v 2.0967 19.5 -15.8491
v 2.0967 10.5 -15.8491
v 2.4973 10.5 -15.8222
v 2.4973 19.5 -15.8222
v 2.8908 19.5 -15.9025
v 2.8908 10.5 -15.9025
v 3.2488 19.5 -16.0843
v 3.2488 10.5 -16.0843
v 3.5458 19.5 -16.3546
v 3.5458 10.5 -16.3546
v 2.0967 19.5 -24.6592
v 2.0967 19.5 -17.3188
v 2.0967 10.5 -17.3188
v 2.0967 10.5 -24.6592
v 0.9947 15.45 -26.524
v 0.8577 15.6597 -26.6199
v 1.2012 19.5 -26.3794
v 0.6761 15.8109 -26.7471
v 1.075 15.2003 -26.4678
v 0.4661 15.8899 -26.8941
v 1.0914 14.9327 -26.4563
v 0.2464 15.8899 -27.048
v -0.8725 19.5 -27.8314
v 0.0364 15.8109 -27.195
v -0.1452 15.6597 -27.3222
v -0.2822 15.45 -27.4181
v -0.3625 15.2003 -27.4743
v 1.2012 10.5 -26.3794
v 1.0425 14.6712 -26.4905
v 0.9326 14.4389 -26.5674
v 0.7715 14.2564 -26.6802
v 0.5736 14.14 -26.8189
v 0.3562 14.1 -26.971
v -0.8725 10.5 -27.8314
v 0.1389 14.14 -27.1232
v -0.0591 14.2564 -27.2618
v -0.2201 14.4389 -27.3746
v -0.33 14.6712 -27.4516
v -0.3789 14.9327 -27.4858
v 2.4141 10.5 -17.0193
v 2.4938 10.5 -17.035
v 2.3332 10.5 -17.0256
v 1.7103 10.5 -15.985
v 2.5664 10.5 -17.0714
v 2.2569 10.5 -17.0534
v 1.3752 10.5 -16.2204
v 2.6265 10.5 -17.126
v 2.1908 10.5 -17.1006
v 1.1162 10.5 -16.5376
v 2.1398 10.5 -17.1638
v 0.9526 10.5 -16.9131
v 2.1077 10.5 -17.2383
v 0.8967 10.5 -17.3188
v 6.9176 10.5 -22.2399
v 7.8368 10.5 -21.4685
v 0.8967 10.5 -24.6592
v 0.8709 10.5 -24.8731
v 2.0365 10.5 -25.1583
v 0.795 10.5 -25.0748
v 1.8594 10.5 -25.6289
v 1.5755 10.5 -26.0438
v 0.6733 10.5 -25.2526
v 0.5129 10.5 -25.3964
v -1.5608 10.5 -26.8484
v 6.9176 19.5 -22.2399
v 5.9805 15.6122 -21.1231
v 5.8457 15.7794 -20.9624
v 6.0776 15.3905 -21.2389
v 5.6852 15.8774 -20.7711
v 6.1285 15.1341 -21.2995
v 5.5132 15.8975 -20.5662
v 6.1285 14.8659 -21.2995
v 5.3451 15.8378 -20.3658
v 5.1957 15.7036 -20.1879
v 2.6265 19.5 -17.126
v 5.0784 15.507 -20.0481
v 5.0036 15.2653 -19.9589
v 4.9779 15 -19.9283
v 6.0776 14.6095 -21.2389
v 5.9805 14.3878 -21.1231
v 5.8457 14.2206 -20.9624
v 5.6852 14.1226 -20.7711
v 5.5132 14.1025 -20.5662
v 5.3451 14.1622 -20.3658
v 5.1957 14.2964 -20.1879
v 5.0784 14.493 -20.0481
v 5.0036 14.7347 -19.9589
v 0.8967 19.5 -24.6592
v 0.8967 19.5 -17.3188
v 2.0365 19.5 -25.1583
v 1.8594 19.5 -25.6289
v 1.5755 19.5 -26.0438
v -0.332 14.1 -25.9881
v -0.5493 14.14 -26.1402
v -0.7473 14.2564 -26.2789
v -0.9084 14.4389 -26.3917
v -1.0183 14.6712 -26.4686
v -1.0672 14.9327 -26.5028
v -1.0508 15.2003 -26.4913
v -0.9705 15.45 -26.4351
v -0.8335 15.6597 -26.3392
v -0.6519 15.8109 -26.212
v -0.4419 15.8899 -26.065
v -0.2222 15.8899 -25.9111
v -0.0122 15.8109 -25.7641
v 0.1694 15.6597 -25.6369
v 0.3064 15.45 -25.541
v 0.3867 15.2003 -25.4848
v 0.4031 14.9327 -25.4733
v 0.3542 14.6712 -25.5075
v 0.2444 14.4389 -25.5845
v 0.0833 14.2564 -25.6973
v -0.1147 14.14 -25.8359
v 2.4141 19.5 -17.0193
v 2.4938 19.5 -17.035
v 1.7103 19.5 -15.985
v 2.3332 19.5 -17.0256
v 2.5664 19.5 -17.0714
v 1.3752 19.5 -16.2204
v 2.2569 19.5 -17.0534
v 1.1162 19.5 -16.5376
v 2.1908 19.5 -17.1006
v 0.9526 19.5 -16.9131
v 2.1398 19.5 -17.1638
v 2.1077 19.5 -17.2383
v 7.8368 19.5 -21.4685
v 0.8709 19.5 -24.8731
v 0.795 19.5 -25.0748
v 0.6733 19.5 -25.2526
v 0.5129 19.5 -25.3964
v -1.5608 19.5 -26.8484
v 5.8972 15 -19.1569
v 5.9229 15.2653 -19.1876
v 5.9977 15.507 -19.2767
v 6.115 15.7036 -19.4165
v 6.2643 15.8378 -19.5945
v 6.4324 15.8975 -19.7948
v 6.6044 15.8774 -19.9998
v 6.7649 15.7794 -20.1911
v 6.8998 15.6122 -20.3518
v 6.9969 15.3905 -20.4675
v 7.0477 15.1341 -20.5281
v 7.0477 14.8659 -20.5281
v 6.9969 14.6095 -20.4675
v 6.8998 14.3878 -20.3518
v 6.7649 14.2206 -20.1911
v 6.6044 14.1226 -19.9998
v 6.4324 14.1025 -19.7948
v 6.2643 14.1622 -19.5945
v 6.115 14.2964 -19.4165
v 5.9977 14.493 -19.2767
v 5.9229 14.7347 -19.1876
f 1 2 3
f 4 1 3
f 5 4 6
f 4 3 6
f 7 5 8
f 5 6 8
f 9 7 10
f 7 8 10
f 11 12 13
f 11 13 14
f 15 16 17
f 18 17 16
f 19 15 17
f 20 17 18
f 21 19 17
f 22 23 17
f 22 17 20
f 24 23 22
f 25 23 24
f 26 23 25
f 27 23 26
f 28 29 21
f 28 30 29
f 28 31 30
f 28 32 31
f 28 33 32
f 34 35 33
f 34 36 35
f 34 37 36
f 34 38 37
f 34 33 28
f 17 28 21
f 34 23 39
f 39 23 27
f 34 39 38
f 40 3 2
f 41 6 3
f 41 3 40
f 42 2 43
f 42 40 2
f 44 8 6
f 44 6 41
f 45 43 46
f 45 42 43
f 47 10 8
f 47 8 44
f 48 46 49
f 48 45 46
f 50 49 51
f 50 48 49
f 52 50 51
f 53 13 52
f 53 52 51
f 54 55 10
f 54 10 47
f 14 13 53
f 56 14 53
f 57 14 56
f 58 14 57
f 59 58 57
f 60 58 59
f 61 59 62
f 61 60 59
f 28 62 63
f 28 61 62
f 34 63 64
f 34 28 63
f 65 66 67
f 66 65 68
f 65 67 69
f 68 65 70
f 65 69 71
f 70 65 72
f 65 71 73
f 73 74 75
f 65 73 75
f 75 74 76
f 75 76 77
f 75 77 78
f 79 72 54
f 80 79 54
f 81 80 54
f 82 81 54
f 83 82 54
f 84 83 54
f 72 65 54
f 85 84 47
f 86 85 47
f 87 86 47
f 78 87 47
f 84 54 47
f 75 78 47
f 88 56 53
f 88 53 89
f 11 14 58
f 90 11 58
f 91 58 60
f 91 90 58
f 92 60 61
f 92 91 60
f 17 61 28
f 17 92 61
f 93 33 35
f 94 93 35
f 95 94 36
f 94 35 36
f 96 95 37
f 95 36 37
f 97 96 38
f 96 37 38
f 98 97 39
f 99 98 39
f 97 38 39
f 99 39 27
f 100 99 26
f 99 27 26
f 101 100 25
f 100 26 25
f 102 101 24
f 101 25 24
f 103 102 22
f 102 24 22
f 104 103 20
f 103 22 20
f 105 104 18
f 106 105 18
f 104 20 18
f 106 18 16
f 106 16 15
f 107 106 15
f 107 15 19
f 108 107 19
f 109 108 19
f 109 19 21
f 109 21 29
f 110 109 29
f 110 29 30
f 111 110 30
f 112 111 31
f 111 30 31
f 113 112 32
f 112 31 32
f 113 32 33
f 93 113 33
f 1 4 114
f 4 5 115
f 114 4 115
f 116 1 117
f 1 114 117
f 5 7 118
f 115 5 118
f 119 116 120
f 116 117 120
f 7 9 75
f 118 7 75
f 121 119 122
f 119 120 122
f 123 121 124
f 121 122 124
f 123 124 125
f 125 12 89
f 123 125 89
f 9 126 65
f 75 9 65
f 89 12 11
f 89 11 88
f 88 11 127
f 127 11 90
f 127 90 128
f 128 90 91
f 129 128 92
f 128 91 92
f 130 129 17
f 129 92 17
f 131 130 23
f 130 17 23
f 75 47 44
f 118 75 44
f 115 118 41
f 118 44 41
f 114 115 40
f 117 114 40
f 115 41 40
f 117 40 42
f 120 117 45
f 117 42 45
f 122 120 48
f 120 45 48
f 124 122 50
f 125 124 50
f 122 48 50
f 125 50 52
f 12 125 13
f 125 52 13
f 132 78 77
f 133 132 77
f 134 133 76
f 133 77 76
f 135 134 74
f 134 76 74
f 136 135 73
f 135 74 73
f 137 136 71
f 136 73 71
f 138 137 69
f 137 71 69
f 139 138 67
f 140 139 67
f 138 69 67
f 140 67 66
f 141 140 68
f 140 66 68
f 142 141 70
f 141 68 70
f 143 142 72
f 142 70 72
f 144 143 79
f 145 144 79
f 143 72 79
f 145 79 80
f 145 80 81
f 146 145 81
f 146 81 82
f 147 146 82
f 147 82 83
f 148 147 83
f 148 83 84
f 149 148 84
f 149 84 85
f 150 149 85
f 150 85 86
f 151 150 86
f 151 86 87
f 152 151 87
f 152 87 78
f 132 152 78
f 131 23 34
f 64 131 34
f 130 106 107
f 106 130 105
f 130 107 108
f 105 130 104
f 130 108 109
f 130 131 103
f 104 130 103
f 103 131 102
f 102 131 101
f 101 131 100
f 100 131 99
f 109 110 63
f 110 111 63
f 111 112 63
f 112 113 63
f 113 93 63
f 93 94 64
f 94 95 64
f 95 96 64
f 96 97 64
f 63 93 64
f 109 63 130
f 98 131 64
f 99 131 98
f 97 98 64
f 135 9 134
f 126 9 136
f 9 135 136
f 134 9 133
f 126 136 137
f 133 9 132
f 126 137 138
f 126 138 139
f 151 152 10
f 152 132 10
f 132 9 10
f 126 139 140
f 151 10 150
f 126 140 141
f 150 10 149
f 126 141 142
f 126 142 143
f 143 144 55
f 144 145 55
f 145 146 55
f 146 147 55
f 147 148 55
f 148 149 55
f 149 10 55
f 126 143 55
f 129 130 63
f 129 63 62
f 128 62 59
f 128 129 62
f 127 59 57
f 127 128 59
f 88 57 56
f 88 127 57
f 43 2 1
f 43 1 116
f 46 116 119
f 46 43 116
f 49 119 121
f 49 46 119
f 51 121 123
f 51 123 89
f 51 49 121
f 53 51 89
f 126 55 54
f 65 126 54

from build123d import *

# Parameters (mm, degrees)
SKETCH_2_W                       = 35
SKETCH_2_H                       = 30
EXTRUDE_1_DEPTH                  = 1
SHEET_START                      = -35
SHEET_METAL_1_OUTLINE_W          = 3
SHEET_METAL_1_OUTLINE_H          = 30
SHEET_METAL_1_DEPTH              = 35
SM_EDGE_FLANGE_1_DEPTH           = 30
SM_EDGE_FLANGE_1_2_DEPTH         = 30
SM_EDGE_FLANGE_2_STRIP_CUT_DEPTH = 30
SM_EDGE_FLANGE_2_DEPTH           = 30
SM_START                         = 4
SM_EDGE_FLANGE_2_PROFILE_W       = 30
SM_EDGE_FLANGE_2_PROFILE_H       = 8.438298848
SM_EDGE_FLANGE_2_PROFILE_R       = 3
SM_EDGE_FLANGE_2_FLAT_DEPTH      = 4
CUT_EXTRUDE_1_REACH              = 58.3
SKETCH_20_R                      = 3
SCALE_1_SCALE                    = 0.3


# Read off the part's stored shape, not the designer's step: 转换实体1, 边线-法兰1
# Sheet-metal steps are written as plain solids
with BuildPart() as part:
    # Sketch 2 → 凸台-拉伸1 (new body)
    with BuildSketch(Plane(origin=(0, 0, 0), x_dir=(0, 0, -1), z_dir=(1, 0, 0))):
        with Locations((17.5, 15)):
            Rectangle(SKETCH_2_W, SKETCH_2_H)
    extrude(amount=EXTRUDE_1_DEPTH)

    # Sheet Metal 1 outline → Sheet Metal 1 (add)
    with BuildSketch(Plane.XY.offset(SHEET_START)):
        with Locations((-1.5, 15)):
            Rectangle(SHEET_METAL_1_OUTLINE_W, SHEET_METAL_1_OUTLINE_H)
    extrude(amount=SHEET_METAL_1_DEPTH)

    # 边线-法兰1 outline → 边线-法兰1 (cut)
    with BuildSketch(Plane(origin=(0, 0, 0), x_dir=(1, 0, 0), z_dir=(0, 1, 0))):
        with BuildLine():
            Line((1, 0), (1, 4.071393241))
            ThreePointArc((1, 4.071393241), (-1.872983346, 5.808095067), (-3, 8.970372727))
            Line((-3, 8.970372727), (-3, 0))
            Line((-3, 0), (1, 0))
        make_face()
    extrude(amount=SM_EDGE_FLANGE_1_DEPTH, mode=Mode.SUBTRACT)

    # Sm Edge Flange 1 2 outline → Sm Edge Flange 1 2 (add)
    with BuildSketch(Plane(origin=(0, 0, 0), x_dir=(1, 0, 0), z_dir=(0, 1, 0))):
        with BuildLine():
            ThreePointArc((1, 4.071393241), (3.646930663, 4.249396197), (5.830222216, 5.756434678))
            Line((5.830222216, 5.756434678), (20.133868015, 22.802855947))
            Line((20.133868015, 22.802855947), (17.069690242, 25.374006385))
            Line((17.069690242, 25.374006385), (2.766044443, 8.327585117))
            ThreePointArc((2.766044443, 8.327585117), (1.657979857, 8.030680106), (1, 8.970372727))
            Line((1, 8.970372727), (1, 4.071393241))
        make_face()
    extrude(amount=SM_EDGE_FLANGE_1_2_DEPTH)

    # 边线-法兰2 strip (across the edge) → 边线-法兰2 strip cut (cut)
    with BuildSketch(Plane(origin=(-3, 30, -35), x_dir=(-0.5735764363510502, 0, 0.8191520442889889), z_dir=(0, -1, 0))):
        Polygon((-19.036380029, 8.446318441), (-1.015035054, -4.172363158), (1.279270691, -0.895754981), (-16.742074283, 11.722926619), align=None)
    extrude(amount=SM_EDGE_FLANGE_2_STRIP_CUT_DEPTH, mode=Mode.SUBTRACT)

    # 边线-法兰2 bend section (across the edge) → 边线-法兰2 (add)
    with BuildSketch(Plane(origin=(-3, 30, -35), x_dir=(-0.5735764363510502, 0, 0.8191520442889889), z_dir=(0, -1, 0))):
        with BuildLine():
            Line((-4, 1.561701152), (0, 1.561701152))
            ThreePointArc((0, 1.561701152), (0.3389675, 0.176455312), (1.279270691, -0.895754981))
            Line((1.279270691, -0.895754981), (-1.015035054, -4.172363158))
            ThreePointArc((-1.015035054, -4.172363158), (-3.209075832, -1.670539141), (-4, 1.561701152))
        make_face()
    extrude(amount=SM_EDGE_FLANGE_2_DEPTH)

    # 边线-法兰2 profile (on flange) → 边线-法兰2 flat (add)
    with BuildSketch(Plane(origin=(-3, 0, -35), x_dir=(0, -1, 0), z_dir=(0.5735764363510502, 0, -0.8191520442889889)).offset(SM_START)):
        with Locations((-15, 5.780850576)):
            Rectangle(SM_EDGE_FLANGE_2_PROFILE_W, SM_EDGE_FLANGE_2_PROFILE_H)
        with Locations((-15, 5)):
            Circle(SM_EDGE_FLANGE_2_PROFILE_R, mode=Mode.SUBTRACT)
    extrude(amount=-SM_EDGE_FLANGE_2_FLAT_DEPTH)

    # 草图20 → 切除-拉伸1 (cut, up to next)
    with BuildSketch(Plane(origin=(-2.477353684, 0, -2.078746562), x_dir=(-0.6427876096865404, 0, 0.7660444431189772), z_dir=(-0.7660444431189772, 0, -0.6427876096865404)), mode=Mode.PRIVATE) as cut_extrude_1_sk1:
        with Locations((-23.351124779, 15)):
            Circle(SKETCH_20_R)
    cut_extrude_1_tool1 = extrude(cut_extrude_1_sk1.sketch, amount=-CUT_EXTRUDE_1_REACH, mode=Mode.PRIVATE) & part.part
    add(cut_extrude_1_tool1.solids().sort_by_distance((12.53246, 15, -19.966746))[0], mode=Mode.SUBTRACT)


with BuildPart() as part_1:
    # 缩放比例1: scaled about (2.566692586, 15, -20.896699523)
    add(part.part.scale(SCALE_1_SCALE).moved(Location((1.79668481, 10.5, -14.627689666))))


solid = part_1.part
